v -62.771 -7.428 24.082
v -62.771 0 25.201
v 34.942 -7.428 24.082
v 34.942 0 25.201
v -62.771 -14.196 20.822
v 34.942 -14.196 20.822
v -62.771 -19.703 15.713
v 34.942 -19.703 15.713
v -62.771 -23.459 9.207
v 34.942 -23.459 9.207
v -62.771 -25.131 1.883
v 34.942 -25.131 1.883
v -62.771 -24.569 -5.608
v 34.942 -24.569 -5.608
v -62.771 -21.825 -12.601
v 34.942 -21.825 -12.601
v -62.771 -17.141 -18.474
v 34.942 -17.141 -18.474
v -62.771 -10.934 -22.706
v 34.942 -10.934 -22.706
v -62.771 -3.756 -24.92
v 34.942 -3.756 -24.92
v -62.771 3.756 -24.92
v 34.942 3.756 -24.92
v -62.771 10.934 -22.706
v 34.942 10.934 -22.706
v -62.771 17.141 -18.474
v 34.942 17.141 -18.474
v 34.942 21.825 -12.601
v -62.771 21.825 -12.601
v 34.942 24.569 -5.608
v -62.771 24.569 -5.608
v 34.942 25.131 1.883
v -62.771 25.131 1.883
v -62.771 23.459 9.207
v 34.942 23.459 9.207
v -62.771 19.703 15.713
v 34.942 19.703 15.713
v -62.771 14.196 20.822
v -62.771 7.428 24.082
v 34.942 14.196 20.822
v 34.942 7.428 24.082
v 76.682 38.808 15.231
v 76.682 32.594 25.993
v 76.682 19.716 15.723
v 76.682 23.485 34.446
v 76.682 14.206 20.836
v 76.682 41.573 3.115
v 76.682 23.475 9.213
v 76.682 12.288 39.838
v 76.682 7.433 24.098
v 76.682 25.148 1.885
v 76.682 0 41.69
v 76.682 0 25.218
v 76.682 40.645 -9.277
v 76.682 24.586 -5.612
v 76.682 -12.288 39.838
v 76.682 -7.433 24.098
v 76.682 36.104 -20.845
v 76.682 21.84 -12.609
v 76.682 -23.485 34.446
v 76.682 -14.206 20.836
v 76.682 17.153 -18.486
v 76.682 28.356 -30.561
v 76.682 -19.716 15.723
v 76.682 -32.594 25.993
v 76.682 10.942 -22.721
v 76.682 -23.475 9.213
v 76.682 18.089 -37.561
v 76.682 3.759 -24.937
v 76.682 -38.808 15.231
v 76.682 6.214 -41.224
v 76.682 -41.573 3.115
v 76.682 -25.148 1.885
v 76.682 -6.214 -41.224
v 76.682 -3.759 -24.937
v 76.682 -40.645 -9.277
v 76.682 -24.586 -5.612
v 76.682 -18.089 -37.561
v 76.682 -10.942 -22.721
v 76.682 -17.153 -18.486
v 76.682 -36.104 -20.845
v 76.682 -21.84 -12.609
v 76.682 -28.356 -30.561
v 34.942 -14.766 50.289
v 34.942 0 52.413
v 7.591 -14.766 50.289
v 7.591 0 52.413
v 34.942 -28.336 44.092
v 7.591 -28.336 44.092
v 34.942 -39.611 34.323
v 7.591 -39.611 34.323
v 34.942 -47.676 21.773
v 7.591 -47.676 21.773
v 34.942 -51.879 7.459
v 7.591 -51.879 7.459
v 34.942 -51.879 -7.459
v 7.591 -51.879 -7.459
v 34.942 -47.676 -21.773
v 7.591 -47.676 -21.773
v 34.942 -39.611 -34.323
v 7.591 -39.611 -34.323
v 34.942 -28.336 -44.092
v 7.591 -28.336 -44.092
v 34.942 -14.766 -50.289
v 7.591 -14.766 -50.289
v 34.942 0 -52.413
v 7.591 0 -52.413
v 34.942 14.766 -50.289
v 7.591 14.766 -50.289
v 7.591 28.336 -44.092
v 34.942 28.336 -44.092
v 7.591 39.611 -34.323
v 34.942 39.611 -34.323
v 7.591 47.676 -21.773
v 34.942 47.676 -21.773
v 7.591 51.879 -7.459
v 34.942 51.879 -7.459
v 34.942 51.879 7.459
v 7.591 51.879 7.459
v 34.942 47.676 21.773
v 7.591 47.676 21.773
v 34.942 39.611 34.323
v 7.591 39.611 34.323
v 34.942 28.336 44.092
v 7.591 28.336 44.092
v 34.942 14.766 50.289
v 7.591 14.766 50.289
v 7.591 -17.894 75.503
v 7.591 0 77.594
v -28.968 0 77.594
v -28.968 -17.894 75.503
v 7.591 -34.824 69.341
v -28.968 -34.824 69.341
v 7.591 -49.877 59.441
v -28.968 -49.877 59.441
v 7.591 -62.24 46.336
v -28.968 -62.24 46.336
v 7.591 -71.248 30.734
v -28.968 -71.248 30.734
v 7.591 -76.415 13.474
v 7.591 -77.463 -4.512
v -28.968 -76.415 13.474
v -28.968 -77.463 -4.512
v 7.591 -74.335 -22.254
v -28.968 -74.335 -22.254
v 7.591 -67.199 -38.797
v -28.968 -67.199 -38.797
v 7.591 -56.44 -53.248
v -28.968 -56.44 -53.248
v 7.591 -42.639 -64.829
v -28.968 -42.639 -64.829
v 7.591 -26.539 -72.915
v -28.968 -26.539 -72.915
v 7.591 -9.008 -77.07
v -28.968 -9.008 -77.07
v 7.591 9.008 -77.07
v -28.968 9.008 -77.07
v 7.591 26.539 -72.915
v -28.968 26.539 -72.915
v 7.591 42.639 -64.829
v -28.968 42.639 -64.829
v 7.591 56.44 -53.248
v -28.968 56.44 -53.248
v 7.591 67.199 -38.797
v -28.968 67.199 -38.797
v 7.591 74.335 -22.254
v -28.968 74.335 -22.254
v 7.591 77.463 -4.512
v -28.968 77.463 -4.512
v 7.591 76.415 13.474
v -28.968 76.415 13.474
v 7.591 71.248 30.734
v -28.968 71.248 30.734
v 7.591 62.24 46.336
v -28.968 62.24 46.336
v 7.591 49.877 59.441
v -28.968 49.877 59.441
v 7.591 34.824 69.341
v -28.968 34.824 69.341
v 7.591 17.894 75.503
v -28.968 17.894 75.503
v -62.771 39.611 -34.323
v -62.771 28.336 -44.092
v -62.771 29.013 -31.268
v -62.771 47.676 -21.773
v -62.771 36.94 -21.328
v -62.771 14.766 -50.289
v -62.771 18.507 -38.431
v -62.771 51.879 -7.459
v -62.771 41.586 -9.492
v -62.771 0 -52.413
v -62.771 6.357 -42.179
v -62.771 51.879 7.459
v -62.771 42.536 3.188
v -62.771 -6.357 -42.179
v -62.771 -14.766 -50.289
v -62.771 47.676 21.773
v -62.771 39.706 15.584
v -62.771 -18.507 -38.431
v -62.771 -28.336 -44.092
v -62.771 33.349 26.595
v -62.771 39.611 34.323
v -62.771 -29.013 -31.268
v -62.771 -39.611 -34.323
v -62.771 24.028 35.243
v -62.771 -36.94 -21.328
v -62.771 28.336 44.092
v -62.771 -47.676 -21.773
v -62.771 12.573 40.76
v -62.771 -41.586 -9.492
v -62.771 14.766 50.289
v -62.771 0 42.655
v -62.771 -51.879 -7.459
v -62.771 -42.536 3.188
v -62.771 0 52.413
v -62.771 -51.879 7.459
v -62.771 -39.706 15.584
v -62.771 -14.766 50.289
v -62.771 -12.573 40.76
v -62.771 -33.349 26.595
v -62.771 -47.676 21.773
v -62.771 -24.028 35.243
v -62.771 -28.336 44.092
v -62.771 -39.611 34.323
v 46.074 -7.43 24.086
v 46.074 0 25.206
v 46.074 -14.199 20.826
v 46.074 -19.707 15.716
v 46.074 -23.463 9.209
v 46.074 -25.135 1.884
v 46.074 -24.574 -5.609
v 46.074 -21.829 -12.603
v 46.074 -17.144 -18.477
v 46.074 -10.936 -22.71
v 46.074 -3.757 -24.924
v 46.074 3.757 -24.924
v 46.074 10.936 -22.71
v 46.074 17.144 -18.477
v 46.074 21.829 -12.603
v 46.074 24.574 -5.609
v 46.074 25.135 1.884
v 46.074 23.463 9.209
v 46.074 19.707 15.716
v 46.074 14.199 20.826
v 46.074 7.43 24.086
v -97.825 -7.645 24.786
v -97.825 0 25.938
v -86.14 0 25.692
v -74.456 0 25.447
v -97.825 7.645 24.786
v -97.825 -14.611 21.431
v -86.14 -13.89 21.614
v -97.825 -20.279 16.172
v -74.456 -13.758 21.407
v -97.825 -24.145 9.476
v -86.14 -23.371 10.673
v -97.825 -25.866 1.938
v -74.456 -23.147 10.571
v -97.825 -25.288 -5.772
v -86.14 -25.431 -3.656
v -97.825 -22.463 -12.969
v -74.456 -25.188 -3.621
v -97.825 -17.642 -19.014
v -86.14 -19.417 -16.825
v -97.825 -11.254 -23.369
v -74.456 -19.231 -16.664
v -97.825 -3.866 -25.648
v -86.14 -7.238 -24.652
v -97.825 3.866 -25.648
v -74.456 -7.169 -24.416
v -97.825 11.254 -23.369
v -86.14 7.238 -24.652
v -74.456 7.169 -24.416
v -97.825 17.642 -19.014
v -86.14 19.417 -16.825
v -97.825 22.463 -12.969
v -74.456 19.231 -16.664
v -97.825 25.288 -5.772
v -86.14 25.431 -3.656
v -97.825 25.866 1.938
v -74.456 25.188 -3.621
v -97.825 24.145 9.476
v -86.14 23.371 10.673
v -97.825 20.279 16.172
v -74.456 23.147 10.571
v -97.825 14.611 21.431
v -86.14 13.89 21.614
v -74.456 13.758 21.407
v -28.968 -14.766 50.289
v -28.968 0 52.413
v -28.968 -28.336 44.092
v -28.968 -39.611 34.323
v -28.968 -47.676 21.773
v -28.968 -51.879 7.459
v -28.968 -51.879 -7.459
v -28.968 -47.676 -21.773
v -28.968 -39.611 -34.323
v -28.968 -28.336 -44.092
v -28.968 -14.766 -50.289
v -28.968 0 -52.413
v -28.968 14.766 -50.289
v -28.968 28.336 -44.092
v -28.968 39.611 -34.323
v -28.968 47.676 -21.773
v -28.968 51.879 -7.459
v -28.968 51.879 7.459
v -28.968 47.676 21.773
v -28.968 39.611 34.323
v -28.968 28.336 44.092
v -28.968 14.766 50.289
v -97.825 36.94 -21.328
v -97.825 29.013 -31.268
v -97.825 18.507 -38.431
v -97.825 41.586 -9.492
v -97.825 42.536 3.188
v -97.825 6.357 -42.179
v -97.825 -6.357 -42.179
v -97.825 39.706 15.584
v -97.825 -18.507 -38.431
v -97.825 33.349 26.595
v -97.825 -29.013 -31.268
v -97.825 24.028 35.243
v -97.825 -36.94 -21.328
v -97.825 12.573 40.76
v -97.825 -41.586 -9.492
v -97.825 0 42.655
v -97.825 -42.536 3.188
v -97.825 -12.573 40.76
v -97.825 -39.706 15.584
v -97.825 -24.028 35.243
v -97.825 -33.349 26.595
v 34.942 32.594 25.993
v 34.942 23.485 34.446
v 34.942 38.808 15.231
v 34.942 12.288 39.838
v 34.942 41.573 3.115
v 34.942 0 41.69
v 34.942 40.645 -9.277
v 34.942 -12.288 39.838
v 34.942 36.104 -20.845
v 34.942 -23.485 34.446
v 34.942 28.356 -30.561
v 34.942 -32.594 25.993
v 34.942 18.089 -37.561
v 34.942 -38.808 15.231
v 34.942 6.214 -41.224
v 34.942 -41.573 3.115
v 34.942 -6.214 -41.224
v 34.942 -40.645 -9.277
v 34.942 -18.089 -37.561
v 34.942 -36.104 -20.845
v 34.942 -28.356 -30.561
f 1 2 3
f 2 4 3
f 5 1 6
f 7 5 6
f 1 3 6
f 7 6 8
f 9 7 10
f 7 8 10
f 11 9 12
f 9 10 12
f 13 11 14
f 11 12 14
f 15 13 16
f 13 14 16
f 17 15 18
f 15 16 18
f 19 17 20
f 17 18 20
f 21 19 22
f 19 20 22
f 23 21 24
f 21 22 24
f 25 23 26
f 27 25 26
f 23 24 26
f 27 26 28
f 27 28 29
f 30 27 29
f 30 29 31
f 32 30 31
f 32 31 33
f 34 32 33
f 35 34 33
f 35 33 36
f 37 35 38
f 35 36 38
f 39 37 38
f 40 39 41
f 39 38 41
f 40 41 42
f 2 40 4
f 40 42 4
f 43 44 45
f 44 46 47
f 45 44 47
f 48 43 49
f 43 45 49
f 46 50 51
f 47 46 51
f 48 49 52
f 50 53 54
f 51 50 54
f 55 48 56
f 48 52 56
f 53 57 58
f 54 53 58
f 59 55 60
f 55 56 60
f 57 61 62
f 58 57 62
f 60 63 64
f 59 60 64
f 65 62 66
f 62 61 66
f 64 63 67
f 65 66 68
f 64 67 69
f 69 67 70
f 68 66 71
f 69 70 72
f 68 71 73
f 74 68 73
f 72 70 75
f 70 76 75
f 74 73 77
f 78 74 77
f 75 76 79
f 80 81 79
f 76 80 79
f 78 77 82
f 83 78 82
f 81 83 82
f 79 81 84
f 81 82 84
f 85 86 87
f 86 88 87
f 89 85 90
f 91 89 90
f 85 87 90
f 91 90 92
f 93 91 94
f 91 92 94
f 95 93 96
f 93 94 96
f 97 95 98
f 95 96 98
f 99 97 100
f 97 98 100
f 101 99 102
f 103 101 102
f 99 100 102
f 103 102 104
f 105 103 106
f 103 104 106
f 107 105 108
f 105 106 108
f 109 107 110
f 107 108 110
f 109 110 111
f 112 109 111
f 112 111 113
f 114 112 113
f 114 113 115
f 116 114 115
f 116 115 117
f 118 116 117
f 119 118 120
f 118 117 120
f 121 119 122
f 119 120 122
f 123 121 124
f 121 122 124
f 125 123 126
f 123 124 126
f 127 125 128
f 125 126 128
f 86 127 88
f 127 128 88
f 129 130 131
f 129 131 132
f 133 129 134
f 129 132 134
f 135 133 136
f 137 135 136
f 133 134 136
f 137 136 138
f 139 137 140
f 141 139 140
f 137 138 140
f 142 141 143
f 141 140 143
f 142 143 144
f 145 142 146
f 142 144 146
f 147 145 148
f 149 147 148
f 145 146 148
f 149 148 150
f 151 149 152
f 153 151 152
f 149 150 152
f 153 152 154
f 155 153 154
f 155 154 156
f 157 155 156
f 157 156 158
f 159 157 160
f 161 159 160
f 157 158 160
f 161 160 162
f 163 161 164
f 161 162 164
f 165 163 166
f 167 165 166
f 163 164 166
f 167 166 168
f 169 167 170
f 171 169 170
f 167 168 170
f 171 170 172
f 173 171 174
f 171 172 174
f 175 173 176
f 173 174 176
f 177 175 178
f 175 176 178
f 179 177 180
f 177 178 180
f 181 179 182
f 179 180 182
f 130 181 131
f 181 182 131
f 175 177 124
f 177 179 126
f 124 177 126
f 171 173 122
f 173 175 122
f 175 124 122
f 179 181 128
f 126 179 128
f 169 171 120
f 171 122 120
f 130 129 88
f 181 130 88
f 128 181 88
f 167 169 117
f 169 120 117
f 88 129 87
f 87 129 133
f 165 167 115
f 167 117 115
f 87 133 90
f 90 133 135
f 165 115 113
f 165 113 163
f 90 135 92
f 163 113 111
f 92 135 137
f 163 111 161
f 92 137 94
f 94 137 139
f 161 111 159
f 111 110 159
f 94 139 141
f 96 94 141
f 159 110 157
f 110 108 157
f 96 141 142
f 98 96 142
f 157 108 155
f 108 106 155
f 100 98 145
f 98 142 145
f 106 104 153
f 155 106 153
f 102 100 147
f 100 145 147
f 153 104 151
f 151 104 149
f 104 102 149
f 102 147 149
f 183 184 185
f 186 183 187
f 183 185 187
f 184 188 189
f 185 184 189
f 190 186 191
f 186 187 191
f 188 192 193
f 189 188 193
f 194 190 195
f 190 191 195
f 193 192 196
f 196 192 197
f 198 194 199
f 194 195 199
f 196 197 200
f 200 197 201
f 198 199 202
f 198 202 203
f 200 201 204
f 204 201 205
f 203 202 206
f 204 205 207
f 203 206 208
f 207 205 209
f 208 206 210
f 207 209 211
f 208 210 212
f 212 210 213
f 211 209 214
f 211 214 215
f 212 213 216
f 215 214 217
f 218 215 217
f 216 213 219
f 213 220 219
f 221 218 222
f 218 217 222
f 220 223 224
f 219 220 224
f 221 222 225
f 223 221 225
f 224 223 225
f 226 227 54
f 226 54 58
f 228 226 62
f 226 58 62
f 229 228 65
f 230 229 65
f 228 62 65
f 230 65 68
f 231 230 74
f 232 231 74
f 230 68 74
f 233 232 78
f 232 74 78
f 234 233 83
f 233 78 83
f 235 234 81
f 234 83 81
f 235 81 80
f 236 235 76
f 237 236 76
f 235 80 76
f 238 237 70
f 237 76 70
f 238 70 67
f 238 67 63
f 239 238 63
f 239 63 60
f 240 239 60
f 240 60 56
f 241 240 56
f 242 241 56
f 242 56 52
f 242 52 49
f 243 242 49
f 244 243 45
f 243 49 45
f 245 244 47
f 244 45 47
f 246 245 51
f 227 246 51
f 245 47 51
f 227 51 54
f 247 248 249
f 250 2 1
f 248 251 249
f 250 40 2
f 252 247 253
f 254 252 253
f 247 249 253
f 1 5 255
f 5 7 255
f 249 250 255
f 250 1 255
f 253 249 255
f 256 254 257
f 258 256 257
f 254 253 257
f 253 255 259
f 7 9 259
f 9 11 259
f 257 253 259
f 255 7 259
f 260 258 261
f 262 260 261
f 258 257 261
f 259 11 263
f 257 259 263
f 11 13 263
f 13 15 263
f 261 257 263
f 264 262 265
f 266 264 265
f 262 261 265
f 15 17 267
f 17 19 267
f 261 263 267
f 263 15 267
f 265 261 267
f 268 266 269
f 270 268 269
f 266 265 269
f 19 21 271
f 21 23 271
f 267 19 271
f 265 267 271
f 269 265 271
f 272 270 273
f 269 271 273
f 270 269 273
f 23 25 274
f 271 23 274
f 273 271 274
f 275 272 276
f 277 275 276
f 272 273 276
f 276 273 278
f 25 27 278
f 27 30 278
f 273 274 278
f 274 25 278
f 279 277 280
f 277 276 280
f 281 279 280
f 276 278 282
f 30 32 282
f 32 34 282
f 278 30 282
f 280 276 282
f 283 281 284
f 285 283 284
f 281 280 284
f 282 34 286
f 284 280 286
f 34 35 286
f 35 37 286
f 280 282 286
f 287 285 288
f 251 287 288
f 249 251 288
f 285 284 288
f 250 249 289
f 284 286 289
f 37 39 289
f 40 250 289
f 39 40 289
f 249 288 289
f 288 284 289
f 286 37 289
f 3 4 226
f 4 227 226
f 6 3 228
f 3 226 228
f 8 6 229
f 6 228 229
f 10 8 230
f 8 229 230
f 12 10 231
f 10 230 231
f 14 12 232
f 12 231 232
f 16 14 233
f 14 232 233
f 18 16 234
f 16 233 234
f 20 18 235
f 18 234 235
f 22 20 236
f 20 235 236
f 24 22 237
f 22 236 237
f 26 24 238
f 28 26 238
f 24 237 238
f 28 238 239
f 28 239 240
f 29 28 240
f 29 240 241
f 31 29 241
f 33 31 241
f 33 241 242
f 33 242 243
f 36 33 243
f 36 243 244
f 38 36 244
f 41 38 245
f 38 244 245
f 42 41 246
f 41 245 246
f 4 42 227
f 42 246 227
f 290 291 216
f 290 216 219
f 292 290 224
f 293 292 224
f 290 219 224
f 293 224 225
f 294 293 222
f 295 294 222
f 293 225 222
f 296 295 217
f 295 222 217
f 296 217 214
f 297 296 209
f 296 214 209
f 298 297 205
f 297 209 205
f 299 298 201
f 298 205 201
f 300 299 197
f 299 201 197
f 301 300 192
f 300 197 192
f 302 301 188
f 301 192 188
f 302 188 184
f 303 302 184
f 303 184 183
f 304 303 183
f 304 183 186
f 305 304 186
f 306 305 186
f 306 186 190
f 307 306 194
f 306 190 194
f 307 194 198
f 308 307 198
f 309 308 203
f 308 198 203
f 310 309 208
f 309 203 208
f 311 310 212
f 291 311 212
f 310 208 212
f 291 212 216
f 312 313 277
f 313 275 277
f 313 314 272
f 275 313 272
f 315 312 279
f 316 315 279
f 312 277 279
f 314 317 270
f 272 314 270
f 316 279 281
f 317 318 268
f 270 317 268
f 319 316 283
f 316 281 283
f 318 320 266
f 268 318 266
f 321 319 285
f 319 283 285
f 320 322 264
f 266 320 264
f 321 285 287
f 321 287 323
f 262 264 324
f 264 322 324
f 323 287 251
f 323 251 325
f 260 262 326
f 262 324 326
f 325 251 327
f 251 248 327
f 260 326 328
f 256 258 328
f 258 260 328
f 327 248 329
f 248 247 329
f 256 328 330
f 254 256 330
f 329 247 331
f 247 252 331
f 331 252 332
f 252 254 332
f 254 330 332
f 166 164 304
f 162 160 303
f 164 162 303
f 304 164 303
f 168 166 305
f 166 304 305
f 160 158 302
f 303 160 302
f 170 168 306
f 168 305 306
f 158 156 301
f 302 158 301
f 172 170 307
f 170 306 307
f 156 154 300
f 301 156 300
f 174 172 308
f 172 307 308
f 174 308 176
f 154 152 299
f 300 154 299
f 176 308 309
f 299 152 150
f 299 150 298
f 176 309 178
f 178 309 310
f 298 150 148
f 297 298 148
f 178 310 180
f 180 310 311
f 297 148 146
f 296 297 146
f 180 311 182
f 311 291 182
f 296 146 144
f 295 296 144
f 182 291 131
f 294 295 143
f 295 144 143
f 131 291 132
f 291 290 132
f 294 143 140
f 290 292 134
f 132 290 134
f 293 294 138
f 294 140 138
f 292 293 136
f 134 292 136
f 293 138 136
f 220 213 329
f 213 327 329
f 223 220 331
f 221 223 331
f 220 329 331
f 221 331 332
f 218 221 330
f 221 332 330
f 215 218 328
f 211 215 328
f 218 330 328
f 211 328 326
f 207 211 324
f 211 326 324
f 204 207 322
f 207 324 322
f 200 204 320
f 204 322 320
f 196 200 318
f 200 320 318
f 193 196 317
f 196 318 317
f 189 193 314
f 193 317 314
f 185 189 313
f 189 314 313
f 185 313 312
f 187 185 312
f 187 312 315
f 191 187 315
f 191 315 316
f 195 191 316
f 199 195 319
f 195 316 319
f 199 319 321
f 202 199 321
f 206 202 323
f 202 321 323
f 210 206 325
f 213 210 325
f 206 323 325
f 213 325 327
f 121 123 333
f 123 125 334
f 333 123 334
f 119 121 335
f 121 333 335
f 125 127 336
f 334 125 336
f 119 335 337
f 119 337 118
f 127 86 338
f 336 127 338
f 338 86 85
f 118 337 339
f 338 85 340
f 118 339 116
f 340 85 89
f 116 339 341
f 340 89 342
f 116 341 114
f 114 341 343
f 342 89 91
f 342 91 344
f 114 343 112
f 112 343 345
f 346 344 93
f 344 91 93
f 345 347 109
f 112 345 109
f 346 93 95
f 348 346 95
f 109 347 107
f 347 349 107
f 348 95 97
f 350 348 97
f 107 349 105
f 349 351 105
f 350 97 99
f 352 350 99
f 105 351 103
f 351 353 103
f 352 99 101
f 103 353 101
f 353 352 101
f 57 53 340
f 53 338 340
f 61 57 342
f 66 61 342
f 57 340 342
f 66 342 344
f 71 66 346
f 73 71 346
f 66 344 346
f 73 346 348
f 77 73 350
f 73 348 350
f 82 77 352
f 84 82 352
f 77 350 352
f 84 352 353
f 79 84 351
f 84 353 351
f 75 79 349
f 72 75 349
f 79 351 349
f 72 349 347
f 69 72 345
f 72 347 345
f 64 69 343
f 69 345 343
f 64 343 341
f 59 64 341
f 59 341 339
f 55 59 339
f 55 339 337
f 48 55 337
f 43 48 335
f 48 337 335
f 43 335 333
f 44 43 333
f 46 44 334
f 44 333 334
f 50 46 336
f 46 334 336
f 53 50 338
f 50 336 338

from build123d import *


with BuildPart() as f1:
    # F0 (on Front) → F1 (revolve)
    with BuildSketch(Plane.XZ):
        Polygon((-97.82505, 25.938069), (-62.771387, 25.201321), (34.941703, 25.201321), (46.073571, 25.205852), (76.681621, 25.21831), (76.681621, 41.68978), (34.941703, 41.68978), (34.941703, 52.412558), (7.590632, 52.412558), (7.590632, 77.59431), (-28.9685, 77.59431), (-28.9685, 52.412558), (-62.771387, 52.412558), (-62.771387, 42.655021), (-97.82505, 42.655021), align=None)
    revolve(axis=Axis((11.750303, 0, 0), (1, 0, 0)))


solid = f1.part
